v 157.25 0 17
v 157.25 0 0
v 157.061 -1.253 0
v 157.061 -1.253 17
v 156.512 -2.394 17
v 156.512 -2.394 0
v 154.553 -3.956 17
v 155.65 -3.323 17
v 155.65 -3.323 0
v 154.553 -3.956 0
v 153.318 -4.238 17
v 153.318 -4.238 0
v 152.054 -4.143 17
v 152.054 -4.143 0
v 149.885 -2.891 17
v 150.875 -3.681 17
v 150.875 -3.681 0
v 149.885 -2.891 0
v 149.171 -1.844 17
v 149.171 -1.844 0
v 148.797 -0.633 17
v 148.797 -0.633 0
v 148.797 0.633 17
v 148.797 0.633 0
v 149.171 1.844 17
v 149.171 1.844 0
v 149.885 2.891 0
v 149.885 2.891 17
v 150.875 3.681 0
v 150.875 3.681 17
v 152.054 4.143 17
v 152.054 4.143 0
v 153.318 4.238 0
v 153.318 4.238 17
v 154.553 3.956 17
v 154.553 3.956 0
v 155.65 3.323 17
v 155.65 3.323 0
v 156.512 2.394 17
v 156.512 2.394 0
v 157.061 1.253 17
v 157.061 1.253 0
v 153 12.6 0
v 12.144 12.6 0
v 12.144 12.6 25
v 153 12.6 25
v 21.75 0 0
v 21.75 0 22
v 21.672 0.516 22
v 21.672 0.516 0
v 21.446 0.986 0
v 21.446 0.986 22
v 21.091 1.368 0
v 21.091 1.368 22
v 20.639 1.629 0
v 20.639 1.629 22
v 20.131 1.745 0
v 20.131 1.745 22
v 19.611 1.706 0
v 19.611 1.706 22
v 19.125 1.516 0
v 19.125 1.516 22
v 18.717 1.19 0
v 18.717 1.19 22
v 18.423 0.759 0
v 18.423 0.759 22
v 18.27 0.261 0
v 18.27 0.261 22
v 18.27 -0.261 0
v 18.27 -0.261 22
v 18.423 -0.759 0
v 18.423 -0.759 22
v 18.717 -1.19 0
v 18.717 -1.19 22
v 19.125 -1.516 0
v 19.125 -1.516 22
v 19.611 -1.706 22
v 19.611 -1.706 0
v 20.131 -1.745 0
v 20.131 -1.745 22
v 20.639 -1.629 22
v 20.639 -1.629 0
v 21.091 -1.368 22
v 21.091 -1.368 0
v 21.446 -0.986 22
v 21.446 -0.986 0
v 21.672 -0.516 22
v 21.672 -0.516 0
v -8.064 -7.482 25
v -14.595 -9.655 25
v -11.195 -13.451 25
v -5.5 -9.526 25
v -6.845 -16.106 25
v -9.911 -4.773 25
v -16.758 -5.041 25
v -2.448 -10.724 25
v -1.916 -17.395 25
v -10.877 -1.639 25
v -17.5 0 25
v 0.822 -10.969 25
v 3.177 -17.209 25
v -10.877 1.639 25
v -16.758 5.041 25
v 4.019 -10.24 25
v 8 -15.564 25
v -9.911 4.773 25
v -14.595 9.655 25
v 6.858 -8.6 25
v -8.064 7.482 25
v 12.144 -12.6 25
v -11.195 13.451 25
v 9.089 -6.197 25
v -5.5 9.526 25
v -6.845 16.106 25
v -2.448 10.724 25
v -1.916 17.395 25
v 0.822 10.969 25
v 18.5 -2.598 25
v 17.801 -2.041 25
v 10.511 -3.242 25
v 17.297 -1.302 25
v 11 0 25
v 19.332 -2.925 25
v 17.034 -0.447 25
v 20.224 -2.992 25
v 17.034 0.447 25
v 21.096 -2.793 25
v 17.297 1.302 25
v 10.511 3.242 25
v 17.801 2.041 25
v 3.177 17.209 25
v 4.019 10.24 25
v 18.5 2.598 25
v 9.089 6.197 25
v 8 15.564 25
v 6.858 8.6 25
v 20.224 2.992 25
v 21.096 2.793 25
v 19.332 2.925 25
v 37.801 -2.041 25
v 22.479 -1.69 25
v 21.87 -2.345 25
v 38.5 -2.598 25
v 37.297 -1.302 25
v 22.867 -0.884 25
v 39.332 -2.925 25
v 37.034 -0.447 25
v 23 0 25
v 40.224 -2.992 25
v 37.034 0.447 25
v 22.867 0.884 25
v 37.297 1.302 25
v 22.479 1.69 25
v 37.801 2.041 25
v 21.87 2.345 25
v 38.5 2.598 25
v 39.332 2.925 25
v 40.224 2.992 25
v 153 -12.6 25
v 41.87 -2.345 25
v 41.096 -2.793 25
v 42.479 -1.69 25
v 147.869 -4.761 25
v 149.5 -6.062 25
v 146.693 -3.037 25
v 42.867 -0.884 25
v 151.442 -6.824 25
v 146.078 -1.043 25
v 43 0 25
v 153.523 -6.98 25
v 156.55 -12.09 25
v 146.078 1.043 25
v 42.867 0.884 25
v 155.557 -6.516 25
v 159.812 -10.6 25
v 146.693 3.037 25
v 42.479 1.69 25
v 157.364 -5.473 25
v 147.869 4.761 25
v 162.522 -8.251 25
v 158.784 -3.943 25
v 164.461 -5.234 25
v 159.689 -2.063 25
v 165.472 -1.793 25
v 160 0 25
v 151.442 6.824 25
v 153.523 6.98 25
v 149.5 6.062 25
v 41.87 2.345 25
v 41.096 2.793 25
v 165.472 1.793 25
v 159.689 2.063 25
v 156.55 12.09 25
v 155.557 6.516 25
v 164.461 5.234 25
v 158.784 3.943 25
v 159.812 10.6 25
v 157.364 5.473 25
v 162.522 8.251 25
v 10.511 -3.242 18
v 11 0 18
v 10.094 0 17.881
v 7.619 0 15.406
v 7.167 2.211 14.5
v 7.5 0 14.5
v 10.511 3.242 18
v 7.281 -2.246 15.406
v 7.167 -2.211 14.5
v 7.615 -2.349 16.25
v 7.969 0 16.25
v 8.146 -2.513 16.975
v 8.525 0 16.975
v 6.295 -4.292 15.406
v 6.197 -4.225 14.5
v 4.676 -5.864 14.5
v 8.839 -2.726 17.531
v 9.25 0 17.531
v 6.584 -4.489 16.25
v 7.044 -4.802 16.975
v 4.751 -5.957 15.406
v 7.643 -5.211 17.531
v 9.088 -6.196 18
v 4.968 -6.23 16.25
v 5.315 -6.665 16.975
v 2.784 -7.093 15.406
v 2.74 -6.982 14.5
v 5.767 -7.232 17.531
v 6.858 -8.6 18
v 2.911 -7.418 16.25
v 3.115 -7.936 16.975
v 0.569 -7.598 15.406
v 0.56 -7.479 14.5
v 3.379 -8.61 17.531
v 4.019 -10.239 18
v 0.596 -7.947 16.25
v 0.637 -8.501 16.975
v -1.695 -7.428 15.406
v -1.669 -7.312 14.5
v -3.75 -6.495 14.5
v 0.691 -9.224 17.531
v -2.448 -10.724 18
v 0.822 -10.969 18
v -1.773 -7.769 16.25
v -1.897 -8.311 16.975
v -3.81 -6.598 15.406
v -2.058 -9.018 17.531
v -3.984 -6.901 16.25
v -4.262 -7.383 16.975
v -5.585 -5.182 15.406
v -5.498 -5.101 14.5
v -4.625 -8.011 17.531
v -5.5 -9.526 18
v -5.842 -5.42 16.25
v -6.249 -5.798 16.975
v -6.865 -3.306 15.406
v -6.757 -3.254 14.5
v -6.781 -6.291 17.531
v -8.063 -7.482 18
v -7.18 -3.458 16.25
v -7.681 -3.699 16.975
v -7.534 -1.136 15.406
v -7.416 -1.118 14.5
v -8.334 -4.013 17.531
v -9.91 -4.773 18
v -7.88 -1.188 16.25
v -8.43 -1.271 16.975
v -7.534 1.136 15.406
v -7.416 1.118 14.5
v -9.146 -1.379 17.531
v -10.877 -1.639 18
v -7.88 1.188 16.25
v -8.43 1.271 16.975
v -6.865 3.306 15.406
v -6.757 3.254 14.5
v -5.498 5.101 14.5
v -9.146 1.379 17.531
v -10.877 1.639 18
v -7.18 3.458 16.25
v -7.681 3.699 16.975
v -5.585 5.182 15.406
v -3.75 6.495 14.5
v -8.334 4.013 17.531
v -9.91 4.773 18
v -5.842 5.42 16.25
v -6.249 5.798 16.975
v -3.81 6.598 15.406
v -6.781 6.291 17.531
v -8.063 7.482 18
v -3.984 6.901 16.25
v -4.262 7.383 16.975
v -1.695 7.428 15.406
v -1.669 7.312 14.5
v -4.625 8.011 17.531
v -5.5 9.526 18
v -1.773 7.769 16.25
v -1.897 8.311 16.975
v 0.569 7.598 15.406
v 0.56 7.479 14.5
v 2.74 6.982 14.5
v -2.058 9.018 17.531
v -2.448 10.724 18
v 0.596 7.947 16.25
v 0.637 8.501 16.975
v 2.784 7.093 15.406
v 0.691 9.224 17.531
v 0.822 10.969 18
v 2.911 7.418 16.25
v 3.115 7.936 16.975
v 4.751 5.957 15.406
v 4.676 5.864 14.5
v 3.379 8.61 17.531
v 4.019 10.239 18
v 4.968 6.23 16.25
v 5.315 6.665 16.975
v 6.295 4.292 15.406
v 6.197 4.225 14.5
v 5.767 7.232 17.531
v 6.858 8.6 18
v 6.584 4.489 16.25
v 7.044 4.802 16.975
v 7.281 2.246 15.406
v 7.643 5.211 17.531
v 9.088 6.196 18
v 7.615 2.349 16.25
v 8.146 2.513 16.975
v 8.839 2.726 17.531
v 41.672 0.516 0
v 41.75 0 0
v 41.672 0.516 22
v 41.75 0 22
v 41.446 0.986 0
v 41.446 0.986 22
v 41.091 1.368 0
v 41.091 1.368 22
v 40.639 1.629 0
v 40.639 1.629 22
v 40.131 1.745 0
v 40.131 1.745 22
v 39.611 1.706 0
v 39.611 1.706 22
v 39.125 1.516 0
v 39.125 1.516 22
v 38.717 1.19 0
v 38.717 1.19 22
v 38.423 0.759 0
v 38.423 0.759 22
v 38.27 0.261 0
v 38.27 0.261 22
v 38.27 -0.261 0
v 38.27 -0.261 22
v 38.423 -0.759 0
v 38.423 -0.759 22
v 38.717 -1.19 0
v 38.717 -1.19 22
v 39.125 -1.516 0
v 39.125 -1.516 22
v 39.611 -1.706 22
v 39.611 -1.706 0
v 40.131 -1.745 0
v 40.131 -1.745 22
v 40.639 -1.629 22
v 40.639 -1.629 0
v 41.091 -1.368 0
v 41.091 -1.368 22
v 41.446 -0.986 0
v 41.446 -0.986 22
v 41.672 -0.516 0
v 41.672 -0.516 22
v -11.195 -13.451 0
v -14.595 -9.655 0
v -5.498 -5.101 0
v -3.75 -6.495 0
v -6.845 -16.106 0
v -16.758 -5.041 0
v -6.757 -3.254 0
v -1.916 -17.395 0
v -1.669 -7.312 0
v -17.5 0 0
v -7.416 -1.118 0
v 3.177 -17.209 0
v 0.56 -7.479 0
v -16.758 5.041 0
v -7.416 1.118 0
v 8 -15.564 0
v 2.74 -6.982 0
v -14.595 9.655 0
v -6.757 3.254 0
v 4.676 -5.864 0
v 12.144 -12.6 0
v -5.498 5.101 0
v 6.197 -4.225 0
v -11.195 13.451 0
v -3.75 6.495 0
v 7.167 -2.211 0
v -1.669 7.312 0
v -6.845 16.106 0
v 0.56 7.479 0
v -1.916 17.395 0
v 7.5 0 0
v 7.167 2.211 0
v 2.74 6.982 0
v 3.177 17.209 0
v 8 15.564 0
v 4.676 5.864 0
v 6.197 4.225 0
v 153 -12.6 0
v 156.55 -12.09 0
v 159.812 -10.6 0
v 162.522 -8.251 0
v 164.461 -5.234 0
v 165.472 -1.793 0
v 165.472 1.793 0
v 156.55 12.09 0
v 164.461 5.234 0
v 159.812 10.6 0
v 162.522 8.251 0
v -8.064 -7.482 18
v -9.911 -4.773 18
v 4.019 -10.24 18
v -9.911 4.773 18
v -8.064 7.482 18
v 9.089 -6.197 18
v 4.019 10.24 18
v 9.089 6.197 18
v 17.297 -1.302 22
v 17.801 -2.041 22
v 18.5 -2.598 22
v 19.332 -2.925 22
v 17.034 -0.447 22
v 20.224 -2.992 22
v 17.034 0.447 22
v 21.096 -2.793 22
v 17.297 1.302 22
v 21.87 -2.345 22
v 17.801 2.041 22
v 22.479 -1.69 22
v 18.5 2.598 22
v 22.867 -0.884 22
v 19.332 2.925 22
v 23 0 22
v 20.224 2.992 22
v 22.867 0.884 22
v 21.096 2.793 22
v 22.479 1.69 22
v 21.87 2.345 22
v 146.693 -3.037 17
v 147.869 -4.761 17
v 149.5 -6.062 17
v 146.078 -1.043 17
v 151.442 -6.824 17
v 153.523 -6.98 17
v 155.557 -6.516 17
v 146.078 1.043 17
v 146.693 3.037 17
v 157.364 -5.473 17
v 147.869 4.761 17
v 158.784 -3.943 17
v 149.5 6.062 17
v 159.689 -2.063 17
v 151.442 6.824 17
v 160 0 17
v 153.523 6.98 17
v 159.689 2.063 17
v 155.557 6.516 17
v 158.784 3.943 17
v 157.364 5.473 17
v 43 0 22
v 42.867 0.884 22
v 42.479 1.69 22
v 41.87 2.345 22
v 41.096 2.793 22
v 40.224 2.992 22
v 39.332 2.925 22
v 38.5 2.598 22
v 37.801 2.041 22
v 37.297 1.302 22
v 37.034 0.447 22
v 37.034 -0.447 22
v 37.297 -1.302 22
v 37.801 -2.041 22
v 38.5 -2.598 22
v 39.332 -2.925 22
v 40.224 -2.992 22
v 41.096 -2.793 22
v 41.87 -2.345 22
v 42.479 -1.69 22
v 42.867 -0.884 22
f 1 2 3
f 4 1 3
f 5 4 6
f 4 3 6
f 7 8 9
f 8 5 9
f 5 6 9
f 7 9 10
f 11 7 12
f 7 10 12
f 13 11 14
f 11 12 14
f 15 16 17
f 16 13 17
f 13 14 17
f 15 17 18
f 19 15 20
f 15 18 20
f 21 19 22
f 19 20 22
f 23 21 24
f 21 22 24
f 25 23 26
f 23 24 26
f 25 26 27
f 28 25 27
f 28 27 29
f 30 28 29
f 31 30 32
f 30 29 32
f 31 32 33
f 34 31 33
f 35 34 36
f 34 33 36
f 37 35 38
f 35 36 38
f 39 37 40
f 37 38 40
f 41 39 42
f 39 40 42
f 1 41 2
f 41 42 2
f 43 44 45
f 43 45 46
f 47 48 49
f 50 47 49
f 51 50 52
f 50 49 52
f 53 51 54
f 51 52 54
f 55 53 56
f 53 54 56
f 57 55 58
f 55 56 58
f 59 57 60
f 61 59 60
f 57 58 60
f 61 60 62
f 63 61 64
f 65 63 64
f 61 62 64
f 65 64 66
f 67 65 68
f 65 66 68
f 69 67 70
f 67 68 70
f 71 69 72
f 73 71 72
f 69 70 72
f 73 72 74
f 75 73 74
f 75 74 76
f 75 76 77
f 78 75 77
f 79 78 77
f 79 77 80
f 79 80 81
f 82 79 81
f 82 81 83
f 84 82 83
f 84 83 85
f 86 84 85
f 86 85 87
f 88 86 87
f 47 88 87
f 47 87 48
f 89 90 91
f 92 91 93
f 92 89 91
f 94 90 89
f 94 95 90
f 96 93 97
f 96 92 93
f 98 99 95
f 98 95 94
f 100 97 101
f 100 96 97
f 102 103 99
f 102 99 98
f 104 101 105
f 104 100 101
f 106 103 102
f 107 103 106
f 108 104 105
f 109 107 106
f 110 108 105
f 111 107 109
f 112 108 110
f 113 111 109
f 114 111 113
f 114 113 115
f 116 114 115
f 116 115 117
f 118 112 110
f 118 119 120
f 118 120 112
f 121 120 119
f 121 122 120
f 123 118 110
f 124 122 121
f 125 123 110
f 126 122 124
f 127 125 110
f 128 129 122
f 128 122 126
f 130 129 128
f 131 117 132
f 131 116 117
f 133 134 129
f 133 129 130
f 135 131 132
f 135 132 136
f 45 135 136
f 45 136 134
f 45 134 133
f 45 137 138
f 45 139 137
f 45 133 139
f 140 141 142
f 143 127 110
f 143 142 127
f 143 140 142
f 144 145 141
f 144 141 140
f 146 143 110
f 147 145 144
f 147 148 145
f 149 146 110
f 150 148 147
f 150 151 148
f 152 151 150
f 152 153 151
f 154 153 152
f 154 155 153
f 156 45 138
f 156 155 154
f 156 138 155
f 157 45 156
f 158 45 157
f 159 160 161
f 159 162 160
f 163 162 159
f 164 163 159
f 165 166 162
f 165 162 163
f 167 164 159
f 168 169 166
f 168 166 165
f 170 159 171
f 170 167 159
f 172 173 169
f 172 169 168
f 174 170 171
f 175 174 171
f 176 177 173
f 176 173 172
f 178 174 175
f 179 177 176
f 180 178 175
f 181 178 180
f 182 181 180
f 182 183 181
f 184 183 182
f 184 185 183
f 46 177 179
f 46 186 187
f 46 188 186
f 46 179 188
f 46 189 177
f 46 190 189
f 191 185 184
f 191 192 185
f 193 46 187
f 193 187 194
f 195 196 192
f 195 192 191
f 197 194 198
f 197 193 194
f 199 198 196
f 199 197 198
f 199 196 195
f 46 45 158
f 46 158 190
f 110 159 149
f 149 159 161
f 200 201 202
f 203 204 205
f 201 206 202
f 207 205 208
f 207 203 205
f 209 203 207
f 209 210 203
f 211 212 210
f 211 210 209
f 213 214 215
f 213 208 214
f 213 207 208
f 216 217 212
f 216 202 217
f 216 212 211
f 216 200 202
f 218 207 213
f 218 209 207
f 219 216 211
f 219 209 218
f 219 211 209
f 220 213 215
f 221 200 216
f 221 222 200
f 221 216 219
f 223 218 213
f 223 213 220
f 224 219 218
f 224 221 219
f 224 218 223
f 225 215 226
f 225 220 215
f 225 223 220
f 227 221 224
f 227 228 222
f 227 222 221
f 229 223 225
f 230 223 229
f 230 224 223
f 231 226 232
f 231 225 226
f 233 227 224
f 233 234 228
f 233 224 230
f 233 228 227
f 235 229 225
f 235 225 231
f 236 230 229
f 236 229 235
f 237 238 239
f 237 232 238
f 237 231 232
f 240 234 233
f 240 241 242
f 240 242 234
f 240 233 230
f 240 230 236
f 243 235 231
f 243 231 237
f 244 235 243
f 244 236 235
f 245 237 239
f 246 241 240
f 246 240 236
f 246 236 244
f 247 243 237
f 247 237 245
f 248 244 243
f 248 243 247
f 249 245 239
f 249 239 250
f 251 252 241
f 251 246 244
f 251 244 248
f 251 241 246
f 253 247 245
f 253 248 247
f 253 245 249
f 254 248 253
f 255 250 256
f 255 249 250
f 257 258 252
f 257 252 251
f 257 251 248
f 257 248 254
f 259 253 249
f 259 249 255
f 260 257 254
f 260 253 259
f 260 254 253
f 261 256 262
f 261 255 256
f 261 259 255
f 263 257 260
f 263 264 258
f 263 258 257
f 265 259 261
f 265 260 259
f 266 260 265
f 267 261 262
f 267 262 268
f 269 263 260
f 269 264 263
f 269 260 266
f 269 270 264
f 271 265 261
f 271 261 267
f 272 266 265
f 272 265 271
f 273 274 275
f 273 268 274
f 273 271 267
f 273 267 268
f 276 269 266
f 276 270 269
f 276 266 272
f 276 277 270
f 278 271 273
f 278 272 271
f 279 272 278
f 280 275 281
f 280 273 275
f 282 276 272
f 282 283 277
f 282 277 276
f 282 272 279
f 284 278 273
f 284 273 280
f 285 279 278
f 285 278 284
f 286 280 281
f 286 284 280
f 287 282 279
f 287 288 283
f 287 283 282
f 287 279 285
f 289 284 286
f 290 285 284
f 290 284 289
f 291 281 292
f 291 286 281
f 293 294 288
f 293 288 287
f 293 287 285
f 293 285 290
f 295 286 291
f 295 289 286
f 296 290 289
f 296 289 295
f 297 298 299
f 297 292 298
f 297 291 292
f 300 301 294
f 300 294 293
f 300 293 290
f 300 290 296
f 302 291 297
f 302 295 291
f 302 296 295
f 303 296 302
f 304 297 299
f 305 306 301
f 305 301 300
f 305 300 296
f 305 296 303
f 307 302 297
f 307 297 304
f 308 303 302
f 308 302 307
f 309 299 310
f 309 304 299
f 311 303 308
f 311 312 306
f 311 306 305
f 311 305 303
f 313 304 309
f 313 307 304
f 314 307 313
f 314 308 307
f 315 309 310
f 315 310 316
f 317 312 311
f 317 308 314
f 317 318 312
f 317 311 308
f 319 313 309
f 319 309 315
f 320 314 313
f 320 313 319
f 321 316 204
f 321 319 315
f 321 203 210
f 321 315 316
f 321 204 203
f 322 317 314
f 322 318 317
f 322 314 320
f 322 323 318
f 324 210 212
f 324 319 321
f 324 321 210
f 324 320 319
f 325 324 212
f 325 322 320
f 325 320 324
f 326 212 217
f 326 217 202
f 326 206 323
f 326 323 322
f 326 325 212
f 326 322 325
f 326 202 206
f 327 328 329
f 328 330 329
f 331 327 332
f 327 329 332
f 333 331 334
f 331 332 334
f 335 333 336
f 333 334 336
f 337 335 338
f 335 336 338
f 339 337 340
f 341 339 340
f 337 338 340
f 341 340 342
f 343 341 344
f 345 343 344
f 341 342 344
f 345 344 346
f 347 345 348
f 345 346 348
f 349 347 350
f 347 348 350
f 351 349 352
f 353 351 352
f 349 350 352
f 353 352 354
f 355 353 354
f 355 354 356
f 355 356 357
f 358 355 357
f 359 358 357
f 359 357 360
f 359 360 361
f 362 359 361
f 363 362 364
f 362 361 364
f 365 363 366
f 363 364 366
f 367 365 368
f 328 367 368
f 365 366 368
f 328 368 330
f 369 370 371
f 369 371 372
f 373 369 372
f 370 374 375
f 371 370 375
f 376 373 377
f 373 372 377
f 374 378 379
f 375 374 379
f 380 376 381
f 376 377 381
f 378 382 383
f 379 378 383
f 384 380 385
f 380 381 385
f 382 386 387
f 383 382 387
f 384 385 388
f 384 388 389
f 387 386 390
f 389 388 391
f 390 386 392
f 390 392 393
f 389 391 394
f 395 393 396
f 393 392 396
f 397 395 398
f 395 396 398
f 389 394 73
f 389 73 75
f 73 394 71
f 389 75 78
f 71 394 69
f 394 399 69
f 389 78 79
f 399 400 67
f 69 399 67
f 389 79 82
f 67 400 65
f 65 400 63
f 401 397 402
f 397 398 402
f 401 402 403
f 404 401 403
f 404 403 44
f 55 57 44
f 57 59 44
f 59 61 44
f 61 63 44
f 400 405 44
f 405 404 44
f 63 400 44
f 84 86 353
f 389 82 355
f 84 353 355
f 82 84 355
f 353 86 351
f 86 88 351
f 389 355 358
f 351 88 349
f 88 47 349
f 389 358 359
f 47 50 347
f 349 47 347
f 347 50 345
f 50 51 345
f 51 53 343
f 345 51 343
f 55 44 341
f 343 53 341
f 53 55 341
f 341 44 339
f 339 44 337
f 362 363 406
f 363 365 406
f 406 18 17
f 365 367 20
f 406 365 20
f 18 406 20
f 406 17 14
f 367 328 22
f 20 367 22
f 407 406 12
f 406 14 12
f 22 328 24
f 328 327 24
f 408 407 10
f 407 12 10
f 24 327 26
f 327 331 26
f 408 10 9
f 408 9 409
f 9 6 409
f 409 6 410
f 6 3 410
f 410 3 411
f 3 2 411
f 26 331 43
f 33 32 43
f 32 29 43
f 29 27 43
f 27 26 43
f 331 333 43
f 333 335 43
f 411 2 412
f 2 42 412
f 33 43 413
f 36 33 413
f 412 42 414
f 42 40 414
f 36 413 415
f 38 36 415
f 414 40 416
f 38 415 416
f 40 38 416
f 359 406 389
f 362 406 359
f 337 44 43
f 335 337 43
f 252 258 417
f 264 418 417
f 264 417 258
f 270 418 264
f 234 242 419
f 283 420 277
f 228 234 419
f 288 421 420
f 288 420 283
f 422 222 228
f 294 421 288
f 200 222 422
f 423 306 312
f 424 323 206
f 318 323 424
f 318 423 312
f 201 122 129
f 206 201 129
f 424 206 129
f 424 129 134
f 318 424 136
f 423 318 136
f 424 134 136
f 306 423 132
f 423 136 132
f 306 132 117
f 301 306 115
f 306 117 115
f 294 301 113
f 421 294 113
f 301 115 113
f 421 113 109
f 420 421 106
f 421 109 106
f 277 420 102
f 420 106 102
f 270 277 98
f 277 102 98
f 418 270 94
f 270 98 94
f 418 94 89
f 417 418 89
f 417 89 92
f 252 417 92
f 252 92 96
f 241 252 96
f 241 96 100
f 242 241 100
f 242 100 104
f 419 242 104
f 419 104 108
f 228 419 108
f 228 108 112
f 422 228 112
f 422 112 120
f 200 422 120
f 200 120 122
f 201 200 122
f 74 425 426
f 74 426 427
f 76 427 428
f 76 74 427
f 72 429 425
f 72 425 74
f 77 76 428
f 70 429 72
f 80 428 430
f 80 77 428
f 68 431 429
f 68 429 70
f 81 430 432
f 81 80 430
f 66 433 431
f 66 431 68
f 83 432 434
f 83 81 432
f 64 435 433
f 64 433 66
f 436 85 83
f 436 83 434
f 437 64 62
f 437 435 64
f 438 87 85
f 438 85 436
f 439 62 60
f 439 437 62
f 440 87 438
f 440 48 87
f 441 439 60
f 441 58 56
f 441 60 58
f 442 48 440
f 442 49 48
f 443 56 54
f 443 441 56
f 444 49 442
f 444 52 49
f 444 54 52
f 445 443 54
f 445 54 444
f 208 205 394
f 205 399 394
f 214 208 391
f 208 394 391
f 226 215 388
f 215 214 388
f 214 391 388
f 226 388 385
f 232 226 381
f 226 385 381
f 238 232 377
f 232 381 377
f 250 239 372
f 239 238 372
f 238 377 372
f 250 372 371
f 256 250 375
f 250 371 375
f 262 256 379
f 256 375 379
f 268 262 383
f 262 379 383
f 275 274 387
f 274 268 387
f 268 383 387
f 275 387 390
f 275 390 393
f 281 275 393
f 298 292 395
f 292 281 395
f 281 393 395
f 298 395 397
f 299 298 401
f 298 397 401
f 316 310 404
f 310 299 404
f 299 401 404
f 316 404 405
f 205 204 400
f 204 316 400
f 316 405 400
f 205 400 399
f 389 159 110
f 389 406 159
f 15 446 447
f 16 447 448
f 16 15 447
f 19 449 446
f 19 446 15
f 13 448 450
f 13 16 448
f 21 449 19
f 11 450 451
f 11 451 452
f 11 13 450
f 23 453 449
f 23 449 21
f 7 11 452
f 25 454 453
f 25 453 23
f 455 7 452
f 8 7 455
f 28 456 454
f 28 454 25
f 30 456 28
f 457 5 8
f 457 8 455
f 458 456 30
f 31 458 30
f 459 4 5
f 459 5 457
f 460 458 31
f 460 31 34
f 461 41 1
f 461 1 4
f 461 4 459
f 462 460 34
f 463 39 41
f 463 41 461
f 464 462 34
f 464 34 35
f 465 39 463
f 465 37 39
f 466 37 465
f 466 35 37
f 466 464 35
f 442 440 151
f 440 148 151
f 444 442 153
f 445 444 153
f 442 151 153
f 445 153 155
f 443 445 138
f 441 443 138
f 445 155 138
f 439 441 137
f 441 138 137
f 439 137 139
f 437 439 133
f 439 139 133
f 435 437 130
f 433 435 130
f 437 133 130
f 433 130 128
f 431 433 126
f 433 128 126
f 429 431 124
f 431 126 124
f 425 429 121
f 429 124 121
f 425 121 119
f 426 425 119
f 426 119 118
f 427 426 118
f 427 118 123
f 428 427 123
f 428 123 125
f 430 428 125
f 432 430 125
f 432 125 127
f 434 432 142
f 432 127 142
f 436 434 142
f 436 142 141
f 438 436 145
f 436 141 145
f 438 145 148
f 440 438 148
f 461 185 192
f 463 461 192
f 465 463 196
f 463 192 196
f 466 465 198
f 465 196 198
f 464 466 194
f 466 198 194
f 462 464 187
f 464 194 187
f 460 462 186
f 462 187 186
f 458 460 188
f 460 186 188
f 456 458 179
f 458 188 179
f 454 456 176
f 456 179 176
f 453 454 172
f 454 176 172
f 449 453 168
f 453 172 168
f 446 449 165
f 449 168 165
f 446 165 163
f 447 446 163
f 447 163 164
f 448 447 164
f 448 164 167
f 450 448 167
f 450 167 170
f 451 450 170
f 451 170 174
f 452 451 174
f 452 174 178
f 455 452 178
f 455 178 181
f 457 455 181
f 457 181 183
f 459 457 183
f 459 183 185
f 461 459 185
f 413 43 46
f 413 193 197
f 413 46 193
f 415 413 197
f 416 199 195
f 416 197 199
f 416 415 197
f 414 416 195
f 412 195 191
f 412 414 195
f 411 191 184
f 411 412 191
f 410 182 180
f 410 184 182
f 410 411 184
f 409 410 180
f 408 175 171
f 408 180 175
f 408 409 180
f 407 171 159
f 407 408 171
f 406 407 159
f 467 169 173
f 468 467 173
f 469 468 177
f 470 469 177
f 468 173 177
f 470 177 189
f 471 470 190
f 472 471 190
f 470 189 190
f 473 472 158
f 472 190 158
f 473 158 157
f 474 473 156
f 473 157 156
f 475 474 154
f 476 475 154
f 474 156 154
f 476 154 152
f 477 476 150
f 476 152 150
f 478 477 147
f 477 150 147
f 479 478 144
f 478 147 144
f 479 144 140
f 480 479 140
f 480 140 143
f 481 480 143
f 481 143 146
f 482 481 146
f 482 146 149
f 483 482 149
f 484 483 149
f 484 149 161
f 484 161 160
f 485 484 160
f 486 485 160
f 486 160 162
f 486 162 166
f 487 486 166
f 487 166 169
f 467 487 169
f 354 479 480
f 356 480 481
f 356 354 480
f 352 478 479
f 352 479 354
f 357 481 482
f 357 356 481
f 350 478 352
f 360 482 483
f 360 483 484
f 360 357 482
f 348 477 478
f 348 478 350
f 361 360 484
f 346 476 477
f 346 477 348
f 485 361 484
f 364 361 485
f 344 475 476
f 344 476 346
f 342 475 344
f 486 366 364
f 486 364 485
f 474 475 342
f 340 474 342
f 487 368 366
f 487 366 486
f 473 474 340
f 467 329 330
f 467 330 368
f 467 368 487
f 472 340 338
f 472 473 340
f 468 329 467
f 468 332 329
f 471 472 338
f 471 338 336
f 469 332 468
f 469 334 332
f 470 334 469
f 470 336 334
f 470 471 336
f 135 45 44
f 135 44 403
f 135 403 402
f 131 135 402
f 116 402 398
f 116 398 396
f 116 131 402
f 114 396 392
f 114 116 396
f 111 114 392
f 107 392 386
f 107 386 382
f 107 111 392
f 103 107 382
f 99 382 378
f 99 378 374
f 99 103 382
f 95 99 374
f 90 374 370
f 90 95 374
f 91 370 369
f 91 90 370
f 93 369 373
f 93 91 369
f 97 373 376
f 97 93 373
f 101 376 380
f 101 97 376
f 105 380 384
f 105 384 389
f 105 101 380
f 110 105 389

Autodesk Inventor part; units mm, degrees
ref_plane "YZ Plane" through (0, 0, 0) normal (1, 0, 0) x (0, 1, 0)
ref_plane "XZ Plane" through (0, 0, 0) normal (0, 1, 0) x (-1, 0, 0)
ref_plane "XY Plane" through (0, 0, 0) normal (0, 0, 1) x (1, 0, 0)
sketch "Sketch1" plane through (0, 0, 0) normal (0, 0, 1) x (1, 0, 0)
  line L0 (0, 12.6) -> (153, 12.6)
  arc A0 (153, -12.6) -> (153, 12.6) centre (153, 0) ccw
  line L1 (153, -12.6) -> (0, -12.6)
  arc A1 (0, 12.6) -> (0, -12.6) centre (0, 0) ccw
  circle A2 centre (0, 0) radius 7.5
  circle A3 centre (153, 0) radius 4.25
  dimension "d0" = 153
  dimension "d2" = 12.6
  dimension "d3" = 15
  dimension "d4" = 8.5
extrude "Extrusion1" add sketch "Sketch1" along normal blind 25
sketch "Sketch2" plane through (0, 0, 25) normal (0, 0, 1) x (1, 0, 0)
  circle A0 centre (0, 0) radius 7.5 projected
  arc A1 (0, 12.6) -> (0, -12.6) centre (0, 0) ccw projected
  circle A2 centre (0, 0) radius 11
  dimension "d7" = 22
extrude "Extrusion2" cut sketch "Sketch2" against normal blind 7
sketch "Sketch4" plane through (0, 0, 25) normal (0, 0, 1) x (1, 0, 0)
  circle A0 centre (0, 0) radius 11 projected
  circle A1 centre (20, 0) radius 1.75
  circle A2 centre (40, 0) radius 1.75
  dimension "d16" = 20
  dimension "d17" = 40
  dimension "d23" = 3.5
extrude "Extrusion3" cut sketch "Sketch4" against normal through all contours A1 | A2
sketch "Sketch5" plane through (0, 0, 25) normal (0, 0, 1) x (1, 0, 0)
  circle A0 centre (20, 0) radius 1.75 projected
  circle A1 centre (40, 0) radius 1.75 projected
  circle A2 centre (40, 0) radius 3
  circle A3 centre (20, 0) radius 3
  dimension "d28" = 6
extrude "Extrusion4" cut sketch "Sketch5" against normal blind 3
sketch "Sketch6" plane through (0, 0, 25) normal (0, 0, 1) x (1, 0, 0)
  line L0 (153, 12.6) -> (0, 12.6) projected
  arc A0 (0, 12.6) -> (0, -12.6) centre (0, 0) ccw projected
  line L1 (0, -12.6) -> (153, -12.6) projected
  arc A1 (12.1445, 12.6) -> (12.1445, -12.6) centre (0, 0) ccw
  dimension "d24" = 35
extrude "Extrusion5" add sketch "Sketch6" against normal up to surface (25 mm away)
sketch "Sketch7" plane through (0, 0, 25) normal (0, 0, 1) x (1, 0, 0)
  circle A0 centre (153, 0) radius 4.25 projected
  arc A1 (153, -12.6) -> (153, 12.6) centre (153, 0) ccw projected
  circle A2 centre (153, 0) radius 7
  dimension "d30" = 14
extrude "Extrusion6" cut sketch "Sketch7" against normal blind 8
fillet "Fillet1" radius 3.5 1 edges at (-7.5, 0, 18)
properties part number "driven arm"
